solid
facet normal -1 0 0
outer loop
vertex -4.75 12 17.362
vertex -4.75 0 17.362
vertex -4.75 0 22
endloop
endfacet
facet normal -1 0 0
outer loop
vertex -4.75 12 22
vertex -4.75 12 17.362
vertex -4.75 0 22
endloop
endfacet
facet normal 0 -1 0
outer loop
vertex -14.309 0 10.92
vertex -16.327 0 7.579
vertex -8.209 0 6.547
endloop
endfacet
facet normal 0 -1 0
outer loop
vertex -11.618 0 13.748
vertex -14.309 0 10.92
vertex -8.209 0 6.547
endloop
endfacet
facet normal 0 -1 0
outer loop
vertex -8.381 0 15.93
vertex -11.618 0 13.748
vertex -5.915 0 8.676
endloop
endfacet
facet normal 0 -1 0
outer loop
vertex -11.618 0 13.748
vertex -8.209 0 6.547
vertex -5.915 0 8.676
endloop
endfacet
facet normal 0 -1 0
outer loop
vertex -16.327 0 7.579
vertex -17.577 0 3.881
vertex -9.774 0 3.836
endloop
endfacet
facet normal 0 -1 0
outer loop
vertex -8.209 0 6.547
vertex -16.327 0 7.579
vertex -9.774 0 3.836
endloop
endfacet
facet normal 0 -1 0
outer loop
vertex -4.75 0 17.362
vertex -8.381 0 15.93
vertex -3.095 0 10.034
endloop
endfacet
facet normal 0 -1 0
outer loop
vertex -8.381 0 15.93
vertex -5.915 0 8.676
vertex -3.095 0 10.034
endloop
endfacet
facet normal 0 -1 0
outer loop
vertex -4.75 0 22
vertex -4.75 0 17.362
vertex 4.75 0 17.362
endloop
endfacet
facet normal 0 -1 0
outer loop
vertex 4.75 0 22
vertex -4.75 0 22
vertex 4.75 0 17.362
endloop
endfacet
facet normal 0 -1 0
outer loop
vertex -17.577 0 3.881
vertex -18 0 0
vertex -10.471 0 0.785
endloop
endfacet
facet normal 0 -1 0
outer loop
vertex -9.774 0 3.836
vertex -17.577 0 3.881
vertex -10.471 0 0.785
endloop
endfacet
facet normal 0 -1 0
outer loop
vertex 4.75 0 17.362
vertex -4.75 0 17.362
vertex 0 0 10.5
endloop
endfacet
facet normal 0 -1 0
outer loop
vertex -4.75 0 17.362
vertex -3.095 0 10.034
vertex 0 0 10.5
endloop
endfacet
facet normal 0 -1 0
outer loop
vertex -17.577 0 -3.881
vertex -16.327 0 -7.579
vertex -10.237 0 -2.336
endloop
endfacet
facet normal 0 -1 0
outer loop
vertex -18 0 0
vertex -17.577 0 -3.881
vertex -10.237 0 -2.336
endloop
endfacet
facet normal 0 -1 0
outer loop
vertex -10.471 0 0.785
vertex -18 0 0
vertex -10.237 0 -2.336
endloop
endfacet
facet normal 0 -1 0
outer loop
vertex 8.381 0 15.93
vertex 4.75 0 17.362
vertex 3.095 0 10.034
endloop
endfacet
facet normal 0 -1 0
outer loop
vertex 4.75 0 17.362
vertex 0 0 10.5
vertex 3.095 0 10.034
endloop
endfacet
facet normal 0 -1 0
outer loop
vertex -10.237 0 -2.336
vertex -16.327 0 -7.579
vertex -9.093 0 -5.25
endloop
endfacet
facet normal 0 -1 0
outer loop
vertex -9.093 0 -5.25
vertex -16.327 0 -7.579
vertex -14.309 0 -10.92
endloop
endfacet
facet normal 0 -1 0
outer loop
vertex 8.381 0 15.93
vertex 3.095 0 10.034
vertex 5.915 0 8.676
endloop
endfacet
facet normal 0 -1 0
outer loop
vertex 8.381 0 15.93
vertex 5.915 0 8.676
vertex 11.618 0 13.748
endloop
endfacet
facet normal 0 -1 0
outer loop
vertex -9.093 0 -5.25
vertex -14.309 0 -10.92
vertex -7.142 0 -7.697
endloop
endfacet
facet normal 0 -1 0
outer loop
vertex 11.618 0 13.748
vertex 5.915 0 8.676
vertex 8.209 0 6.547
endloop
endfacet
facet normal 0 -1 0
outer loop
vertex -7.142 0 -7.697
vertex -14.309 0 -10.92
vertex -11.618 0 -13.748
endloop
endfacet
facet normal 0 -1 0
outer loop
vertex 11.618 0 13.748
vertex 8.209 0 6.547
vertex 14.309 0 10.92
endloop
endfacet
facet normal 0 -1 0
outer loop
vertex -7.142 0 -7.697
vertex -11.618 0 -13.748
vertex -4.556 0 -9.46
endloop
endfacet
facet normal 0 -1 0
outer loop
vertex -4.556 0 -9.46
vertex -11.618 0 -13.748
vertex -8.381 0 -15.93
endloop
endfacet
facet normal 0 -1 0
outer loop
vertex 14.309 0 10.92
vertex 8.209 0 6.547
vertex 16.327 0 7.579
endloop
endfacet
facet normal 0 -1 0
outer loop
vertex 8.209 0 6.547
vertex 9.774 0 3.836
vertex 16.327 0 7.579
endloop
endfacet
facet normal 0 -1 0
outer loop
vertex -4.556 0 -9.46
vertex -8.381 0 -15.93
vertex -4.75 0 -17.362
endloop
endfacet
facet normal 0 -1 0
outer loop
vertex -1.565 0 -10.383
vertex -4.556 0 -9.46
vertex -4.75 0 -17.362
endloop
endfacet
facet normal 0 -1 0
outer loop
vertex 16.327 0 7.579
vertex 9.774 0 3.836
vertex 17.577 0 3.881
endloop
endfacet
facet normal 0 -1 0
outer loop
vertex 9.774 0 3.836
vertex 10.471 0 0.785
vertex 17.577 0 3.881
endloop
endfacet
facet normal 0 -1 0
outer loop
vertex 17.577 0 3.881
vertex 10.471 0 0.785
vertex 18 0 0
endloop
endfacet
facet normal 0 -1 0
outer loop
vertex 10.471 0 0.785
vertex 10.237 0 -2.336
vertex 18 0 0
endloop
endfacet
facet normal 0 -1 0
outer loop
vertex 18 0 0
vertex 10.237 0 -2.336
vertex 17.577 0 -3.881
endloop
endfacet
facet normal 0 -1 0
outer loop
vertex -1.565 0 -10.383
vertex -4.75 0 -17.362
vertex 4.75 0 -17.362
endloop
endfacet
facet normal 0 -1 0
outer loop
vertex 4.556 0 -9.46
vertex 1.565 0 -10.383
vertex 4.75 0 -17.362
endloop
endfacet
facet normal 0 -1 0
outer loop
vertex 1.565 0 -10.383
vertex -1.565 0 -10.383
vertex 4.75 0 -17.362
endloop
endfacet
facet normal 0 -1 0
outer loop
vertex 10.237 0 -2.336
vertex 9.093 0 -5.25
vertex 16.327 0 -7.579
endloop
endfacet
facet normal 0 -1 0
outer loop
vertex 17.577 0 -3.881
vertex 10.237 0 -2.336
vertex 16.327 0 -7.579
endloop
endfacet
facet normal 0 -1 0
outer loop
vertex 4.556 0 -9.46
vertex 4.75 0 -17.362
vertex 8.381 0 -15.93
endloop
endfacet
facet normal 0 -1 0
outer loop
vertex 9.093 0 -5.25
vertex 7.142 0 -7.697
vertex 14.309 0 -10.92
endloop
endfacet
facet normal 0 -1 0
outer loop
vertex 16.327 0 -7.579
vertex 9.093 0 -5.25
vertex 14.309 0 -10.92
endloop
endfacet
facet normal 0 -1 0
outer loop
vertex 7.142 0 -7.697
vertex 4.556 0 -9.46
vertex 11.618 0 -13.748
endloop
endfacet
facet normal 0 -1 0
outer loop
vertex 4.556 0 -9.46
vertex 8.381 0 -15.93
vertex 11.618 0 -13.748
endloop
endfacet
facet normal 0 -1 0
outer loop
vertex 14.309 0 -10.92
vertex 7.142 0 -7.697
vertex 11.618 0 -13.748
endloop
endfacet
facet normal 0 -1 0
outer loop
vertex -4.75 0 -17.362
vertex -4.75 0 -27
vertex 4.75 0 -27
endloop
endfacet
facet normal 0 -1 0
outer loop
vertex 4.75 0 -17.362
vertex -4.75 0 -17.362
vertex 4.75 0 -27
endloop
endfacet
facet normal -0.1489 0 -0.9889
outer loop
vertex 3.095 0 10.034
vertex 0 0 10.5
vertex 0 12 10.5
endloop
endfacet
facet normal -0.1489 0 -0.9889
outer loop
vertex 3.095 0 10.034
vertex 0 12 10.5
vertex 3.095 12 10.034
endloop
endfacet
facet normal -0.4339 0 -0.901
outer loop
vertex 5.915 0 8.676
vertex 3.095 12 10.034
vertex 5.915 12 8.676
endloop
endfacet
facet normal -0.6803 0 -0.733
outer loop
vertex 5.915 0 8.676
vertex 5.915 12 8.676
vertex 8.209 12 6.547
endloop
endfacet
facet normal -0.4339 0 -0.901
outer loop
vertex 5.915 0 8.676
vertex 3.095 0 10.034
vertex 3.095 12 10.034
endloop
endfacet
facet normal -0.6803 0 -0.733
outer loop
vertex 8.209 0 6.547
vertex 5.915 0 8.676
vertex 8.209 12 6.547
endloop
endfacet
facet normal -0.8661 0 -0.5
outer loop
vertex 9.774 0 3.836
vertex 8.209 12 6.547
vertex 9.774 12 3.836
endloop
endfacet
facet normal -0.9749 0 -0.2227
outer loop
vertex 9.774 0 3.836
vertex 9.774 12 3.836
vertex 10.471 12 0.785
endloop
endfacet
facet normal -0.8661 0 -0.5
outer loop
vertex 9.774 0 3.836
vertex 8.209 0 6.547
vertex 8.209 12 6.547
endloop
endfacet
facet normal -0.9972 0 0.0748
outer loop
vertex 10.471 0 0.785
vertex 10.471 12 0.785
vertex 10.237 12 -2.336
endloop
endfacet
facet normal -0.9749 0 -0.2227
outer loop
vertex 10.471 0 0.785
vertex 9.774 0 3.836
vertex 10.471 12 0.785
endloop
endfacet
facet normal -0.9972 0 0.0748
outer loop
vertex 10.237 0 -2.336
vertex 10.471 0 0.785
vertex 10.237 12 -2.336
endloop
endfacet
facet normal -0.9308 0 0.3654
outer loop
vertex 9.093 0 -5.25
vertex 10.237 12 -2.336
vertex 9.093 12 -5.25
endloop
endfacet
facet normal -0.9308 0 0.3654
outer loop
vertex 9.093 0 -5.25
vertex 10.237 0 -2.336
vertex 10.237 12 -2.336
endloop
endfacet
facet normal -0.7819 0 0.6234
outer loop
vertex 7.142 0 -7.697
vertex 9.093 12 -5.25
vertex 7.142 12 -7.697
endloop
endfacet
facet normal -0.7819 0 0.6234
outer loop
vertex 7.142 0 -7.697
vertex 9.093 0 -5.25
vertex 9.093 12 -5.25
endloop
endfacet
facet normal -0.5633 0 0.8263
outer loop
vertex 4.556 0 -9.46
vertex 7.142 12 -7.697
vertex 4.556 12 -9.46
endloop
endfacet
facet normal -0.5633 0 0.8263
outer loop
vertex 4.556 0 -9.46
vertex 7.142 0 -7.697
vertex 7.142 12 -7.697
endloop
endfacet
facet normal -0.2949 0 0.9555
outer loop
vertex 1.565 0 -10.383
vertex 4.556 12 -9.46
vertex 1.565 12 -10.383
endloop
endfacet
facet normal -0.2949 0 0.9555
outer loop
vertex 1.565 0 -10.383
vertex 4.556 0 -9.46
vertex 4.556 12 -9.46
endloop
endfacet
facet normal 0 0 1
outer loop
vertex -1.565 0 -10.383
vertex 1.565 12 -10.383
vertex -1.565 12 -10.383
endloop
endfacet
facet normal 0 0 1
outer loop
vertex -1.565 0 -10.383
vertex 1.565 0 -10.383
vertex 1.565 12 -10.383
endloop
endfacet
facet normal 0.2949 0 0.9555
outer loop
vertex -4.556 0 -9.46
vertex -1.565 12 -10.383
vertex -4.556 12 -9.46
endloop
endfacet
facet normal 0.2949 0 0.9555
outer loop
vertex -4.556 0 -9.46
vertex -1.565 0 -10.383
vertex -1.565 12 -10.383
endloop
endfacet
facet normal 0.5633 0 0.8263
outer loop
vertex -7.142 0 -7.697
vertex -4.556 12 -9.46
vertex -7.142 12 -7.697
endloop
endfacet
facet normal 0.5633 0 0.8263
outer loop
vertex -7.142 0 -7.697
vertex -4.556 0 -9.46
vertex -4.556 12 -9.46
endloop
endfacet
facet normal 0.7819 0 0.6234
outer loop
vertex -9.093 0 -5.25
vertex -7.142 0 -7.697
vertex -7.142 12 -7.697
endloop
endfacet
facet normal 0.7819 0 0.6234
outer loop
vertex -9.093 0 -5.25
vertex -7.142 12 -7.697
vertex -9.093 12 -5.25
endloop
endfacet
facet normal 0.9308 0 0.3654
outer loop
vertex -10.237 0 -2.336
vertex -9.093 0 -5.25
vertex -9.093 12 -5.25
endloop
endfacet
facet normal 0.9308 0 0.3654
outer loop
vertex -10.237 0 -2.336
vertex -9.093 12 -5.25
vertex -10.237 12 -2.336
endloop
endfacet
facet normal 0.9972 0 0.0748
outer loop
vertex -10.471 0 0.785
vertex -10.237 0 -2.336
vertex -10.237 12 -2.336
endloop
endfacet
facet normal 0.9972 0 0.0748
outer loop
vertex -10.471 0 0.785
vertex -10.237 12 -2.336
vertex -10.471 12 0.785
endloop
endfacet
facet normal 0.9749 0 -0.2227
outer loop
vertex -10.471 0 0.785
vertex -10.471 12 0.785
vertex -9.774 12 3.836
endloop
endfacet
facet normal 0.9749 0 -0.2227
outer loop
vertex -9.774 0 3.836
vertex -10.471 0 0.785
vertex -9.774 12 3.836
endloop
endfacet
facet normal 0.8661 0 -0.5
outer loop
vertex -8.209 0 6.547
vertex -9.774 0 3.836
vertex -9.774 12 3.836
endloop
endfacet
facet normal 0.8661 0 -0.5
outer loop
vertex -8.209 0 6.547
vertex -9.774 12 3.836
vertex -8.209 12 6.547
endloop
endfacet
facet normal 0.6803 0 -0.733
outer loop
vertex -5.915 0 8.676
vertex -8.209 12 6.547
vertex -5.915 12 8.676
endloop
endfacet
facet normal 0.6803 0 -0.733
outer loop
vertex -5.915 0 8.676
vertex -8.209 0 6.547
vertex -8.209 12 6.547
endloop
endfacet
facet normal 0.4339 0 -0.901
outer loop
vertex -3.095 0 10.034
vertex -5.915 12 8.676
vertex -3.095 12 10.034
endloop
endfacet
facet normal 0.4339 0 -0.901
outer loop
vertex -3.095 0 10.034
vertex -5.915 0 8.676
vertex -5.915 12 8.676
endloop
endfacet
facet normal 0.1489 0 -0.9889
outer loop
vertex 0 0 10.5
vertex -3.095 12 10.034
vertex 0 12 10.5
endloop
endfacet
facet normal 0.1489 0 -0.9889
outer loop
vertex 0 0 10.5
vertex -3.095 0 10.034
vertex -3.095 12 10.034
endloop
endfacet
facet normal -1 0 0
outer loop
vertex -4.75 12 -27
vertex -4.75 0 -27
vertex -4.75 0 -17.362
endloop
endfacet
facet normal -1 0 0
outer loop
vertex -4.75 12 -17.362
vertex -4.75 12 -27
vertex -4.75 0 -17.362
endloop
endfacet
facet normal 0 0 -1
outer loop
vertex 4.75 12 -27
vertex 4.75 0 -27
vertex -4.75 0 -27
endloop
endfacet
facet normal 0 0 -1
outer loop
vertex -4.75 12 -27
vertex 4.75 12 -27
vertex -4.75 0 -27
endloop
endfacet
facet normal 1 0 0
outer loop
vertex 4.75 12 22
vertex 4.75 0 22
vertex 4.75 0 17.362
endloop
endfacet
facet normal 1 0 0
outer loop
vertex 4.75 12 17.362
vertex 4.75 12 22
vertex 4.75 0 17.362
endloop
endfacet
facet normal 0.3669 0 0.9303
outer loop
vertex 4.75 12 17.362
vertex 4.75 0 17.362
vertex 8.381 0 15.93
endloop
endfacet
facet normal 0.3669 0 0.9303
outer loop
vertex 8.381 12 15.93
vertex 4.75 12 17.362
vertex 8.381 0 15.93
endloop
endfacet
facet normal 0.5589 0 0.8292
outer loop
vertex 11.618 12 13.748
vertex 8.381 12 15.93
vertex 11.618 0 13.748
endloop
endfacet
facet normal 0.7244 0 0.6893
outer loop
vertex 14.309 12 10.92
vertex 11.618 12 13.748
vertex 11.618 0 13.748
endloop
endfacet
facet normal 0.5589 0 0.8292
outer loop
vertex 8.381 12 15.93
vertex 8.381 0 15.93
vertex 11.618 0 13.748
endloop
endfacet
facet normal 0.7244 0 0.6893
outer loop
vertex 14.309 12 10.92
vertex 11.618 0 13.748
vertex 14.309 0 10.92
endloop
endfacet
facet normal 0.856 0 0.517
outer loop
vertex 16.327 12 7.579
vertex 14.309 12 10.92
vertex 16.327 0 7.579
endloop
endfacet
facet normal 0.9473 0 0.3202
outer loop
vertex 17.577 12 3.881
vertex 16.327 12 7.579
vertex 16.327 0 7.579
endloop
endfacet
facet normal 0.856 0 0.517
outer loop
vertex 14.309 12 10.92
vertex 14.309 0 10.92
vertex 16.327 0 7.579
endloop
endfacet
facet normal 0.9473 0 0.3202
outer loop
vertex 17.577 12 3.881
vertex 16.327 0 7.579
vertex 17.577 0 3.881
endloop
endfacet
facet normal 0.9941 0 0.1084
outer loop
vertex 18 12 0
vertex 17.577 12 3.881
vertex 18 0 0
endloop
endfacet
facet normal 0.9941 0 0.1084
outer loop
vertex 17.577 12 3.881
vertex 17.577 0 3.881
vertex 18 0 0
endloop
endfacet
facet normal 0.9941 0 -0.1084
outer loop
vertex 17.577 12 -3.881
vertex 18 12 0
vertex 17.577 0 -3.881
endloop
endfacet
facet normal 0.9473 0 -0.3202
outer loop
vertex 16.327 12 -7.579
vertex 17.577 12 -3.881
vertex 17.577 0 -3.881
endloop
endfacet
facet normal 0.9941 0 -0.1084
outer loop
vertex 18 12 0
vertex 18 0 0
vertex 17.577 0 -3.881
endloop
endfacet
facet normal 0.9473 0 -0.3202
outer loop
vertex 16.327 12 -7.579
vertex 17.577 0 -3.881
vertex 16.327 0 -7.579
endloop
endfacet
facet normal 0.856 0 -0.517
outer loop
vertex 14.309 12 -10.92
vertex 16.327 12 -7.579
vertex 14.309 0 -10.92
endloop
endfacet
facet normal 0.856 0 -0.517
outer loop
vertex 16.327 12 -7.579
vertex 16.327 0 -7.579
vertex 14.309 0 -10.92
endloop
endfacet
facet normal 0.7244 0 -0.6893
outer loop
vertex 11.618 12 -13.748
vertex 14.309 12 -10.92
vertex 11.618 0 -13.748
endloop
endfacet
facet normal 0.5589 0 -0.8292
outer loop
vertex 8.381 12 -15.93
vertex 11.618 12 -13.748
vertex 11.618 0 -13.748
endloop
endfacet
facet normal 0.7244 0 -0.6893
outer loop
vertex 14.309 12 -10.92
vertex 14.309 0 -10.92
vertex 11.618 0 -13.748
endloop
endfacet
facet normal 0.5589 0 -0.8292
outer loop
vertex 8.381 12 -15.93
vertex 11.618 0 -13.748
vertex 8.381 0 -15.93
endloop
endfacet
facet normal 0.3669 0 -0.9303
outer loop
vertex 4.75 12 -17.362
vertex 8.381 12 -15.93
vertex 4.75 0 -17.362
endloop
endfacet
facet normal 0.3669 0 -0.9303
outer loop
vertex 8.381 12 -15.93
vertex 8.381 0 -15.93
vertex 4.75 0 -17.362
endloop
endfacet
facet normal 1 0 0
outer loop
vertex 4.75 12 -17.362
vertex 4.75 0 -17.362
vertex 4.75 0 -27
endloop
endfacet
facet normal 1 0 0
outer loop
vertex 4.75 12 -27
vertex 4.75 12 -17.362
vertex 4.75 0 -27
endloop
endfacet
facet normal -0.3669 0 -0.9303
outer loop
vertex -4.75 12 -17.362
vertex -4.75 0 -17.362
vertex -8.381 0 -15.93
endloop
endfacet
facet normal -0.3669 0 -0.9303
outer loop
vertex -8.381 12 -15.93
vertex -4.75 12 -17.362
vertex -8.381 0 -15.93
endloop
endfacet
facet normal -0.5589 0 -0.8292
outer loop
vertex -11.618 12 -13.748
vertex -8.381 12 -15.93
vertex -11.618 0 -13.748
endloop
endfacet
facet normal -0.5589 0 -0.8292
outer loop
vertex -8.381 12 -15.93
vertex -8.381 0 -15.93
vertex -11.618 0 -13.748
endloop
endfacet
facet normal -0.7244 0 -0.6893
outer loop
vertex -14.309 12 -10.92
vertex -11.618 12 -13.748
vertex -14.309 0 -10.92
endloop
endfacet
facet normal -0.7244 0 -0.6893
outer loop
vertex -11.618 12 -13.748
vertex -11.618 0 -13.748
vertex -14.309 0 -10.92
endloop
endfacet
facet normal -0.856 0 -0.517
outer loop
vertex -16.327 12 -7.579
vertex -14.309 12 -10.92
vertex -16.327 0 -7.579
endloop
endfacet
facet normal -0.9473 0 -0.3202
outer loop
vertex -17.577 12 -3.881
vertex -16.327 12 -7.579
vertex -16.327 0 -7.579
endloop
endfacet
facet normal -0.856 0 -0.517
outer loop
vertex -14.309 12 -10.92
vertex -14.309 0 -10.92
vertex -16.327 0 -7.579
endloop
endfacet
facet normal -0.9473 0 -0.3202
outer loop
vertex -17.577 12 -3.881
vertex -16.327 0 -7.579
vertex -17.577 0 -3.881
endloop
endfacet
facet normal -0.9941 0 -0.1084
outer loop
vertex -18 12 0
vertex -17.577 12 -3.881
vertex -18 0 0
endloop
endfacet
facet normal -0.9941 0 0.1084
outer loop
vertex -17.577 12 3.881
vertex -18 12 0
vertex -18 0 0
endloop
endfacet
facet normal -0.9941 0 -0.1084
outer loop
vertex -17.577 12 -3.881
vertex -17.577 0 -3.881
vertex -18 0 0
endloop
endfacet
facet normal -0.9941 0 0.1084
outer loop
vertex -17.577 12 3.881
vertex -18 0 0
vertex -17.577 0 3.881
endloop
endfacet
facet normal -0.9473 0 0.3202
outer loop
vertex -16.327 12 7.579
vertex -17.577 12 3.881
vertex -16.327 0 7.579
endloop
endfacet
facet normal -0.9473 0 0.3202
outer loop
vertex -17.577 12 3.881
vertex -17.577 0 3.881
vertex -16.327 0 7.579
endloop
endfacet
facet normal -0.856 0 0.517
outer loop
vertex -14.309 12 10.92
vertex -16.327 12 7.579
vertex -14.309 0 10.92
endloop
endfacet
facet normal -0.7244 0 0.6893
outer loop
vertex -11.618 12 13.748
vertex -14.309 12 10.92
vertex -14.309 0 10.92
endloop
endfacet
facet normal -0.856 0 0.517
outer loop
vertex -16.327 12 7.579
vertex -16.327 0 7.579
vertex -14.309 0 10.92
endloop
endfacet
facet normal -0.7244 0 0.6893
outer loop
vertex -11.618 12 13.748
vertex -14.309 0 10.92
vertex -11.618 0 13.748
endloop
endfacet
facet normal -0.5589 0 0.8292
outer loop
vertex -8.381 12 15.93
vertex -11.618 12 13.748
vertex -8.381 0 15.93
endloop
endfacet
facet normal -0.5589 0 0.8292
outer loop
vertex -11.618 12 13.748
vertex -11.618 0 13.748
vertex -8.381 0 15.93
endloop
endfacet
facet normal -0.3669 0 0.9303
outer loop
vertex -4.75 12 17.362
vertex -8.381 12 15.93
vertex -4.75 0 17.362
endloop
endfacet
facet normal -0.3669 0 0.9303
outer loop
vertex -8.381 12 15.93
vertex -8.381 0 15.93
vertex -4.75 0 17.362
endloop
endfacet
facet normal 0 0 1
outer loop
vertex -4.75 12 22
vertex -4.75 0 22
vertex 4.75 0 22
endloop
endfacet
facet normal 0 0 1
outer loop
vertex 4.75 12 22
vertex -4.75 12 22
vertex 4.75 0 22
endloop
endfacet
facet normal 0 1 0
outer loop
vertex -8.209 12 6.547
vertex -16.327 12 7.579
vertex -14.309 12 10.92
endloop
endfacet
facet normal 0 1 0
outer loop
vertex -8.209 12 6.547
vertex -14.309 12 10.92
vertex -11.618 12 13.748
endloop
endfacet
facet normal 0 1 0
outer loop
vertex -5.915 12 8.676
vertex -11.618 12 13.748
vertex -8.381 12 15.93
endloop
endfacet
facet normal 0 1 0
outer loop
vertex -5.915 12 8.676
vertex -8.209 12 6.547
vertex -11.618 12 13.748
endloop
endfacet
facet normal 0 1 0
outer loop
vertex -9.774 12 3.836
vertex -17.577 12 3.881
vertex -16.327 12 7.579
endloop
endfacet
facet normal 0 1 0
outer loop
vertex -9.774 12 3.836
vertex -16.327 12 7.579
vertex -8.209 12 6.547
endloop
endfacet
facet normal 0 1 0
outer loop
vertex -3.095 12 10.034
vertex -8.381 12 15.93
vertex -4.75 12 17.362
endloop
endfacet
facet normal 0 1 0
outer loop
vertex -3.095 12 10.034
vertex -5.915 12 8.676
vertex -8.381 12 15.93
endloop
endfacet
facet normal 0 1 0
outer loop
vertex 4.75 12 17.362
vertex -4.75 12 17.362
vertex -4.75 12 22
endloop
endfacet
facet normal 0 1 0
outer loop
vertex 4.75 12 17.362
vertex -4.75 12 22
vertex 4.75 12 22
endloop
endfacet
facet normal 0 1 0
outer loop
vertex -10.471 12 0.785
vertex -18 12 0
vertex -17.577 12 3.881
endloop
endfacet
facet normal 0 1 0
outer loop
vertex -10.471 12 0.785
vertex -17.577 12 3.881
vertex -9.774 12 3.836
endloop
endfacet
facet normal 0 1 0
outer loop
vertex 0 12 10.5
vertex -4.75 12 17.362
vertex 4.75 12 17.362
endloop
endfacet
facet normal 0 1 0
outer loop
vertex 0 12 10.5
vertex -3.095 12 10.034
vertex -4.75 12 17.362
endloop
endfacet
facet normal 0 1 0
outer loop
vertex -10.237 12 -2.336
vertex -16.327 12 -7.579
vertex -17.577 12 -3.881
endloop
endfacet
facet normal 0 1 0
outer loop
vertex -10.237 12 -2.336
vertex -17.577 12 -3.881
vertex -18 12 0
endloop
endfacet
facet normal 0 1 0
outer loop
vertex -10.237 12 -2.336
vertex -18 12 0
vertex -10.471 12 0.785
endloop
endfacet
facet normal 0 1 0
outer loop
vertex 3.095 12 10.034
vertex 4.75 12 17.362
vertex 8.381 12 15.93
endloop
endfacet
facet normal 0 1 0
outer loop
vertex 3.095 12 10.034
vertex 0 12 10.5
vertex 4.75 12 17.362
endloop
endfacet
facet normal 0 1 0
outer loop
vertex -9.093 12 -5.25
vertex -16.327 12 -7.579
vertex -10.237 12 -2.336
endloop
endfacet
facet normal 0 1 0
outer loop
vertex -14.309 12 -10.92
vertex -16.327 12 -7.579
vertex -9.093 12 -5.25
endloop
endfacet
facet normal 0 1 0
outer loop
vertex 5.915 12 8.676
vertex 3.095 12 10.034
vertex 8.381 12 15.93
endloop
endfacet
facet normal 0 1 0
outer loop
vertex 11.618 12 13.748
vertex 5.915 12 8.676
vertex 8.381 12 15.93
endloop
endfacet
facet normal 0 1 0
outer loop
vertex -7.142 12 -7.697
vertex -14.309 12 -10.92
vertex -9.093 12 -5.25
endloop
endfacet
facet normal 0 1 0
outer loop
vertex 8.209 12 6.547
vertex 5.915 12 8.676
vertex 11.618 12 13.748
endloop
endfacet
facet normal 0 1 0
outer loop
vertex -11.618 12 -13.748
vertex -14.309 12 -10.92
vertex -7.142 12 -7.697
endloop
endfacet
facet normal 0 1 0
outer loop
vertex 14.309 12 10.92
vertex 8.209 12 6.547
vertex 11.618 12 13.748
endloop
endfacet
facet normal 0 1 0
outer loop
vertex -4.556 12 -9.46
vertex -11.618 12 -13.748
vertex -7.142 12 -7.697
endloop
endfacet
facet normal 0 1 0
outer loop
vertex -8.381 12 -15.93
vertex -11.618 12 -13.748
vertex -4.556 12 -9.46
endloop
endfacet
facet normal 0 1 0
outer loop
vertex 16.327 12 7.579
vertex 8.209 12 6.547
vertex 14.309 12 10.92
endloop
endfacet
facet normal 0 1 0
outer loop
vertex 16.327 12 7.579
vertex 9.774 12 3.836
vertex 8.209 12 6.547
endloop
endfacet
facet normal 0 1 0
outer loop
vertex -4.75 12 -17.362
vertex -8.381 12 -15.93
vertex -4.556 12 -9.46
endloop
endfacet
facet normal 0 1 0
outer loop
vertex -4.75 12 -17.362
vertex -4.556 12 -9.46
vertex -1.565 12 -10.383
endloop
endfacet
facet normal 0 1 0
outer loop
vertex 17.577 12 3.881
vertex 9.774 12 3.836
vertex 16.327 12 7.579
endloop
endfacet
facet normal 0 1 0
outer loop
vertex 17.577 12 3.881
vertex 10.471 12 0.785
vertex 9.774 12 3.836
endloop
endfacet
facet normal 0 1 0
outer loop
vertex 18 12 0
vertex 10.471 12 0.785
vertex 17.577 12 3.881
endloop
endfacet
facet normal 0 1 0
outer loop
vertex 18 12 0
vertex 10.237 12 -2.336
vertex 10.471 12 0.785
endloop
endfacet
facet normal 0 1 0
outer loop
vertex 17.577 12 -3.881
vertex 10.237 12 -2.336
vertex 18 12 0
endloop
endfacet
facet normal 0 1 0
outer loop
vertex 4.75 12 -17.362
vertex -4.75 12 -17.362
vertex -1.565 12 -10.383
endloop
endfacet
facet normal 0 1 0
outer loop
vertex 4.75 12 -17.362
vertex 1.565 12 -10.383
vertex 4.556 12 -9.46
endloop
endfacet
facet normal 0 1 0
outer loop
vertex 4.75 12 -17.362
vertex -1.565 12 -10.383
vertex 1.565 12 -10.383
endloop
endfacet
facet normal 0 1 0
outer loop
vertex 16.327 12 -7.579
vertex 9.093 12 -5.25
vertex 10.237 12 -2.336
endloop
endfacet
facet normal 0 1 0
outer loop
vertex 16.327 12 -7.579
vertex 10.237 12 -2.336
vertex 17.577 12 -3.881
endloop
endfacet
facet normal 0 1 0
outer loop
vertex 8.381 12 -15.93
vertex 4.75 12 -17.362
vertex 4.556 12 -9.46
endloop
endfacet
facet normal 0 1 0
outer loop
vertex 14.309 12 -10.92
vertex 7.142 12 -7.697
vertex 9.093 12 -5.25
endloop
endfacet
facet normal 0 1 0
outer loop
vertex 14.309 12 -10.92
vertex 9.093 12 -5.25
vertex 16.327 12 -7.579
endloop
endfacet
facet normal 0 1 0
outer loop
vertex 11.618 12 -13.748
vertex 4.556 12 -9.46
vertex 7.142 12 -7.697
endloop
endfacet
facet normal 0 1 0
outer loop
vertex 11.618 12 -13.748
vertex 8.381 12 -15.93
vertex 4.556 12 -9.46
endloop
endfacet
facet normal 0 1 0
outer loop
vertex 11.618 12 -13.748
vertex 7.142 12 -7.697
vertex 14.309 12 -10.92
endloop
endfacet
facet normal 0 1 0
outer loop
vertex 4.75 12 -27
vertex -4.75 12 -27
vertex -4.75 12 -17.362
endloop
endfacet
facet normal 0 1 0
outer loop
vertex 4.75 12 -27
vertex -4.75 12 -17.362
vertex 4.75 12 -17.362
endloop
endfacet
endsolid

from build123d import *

# Parameters (mm, degrees)
ESQUISSE2_R        = 18
ESQUISSE2_R_2      = 10.5
BOSS_EXTRU_1_DEPTH = 12


with BuildPart() as part:
    # Esquisse2 → Boss.-Extru.1 (new body)
    with BuildSketch(Plane(origin=(0, 0, 0), x_dir=(1, 0, 0), z_dir=(0, 1, 0))):
        Circle(ESQUISSE2_R)
        with Locations(Location((0, 0, 0), (0, 0, 270))):  # turned: the seam where the file's is
            Circle(ESQUISSE2_R_2, mode=Mode.SUBTRACT)
        with BuildLine():
            Line((-4.75, -17.361955535), (-4.75, -22))
            Line((-4.75, -22), (4.75, -22))
            Line((4.75, -22), (4.75, -17.361955535))
            ThreePointArc((4.75, -17.361955535), (0, -18), (-4.75, -17.361955535))
        make_face()
        with BuildLine():
            Line((-4.75, 27), (-4.75, 17.361955535))
            ThreePointArc((-4.75, 17.361955535), (0, 18), (4.75, 17.361955535))
            Line((4.75, 17.361955535), (4.75, 27))
            Line((4.75, 27), (-4.75, 27))
        make_face()
    extrude(amount=BOSS_EXTRU_1_DEPTH)


solid = part.part
